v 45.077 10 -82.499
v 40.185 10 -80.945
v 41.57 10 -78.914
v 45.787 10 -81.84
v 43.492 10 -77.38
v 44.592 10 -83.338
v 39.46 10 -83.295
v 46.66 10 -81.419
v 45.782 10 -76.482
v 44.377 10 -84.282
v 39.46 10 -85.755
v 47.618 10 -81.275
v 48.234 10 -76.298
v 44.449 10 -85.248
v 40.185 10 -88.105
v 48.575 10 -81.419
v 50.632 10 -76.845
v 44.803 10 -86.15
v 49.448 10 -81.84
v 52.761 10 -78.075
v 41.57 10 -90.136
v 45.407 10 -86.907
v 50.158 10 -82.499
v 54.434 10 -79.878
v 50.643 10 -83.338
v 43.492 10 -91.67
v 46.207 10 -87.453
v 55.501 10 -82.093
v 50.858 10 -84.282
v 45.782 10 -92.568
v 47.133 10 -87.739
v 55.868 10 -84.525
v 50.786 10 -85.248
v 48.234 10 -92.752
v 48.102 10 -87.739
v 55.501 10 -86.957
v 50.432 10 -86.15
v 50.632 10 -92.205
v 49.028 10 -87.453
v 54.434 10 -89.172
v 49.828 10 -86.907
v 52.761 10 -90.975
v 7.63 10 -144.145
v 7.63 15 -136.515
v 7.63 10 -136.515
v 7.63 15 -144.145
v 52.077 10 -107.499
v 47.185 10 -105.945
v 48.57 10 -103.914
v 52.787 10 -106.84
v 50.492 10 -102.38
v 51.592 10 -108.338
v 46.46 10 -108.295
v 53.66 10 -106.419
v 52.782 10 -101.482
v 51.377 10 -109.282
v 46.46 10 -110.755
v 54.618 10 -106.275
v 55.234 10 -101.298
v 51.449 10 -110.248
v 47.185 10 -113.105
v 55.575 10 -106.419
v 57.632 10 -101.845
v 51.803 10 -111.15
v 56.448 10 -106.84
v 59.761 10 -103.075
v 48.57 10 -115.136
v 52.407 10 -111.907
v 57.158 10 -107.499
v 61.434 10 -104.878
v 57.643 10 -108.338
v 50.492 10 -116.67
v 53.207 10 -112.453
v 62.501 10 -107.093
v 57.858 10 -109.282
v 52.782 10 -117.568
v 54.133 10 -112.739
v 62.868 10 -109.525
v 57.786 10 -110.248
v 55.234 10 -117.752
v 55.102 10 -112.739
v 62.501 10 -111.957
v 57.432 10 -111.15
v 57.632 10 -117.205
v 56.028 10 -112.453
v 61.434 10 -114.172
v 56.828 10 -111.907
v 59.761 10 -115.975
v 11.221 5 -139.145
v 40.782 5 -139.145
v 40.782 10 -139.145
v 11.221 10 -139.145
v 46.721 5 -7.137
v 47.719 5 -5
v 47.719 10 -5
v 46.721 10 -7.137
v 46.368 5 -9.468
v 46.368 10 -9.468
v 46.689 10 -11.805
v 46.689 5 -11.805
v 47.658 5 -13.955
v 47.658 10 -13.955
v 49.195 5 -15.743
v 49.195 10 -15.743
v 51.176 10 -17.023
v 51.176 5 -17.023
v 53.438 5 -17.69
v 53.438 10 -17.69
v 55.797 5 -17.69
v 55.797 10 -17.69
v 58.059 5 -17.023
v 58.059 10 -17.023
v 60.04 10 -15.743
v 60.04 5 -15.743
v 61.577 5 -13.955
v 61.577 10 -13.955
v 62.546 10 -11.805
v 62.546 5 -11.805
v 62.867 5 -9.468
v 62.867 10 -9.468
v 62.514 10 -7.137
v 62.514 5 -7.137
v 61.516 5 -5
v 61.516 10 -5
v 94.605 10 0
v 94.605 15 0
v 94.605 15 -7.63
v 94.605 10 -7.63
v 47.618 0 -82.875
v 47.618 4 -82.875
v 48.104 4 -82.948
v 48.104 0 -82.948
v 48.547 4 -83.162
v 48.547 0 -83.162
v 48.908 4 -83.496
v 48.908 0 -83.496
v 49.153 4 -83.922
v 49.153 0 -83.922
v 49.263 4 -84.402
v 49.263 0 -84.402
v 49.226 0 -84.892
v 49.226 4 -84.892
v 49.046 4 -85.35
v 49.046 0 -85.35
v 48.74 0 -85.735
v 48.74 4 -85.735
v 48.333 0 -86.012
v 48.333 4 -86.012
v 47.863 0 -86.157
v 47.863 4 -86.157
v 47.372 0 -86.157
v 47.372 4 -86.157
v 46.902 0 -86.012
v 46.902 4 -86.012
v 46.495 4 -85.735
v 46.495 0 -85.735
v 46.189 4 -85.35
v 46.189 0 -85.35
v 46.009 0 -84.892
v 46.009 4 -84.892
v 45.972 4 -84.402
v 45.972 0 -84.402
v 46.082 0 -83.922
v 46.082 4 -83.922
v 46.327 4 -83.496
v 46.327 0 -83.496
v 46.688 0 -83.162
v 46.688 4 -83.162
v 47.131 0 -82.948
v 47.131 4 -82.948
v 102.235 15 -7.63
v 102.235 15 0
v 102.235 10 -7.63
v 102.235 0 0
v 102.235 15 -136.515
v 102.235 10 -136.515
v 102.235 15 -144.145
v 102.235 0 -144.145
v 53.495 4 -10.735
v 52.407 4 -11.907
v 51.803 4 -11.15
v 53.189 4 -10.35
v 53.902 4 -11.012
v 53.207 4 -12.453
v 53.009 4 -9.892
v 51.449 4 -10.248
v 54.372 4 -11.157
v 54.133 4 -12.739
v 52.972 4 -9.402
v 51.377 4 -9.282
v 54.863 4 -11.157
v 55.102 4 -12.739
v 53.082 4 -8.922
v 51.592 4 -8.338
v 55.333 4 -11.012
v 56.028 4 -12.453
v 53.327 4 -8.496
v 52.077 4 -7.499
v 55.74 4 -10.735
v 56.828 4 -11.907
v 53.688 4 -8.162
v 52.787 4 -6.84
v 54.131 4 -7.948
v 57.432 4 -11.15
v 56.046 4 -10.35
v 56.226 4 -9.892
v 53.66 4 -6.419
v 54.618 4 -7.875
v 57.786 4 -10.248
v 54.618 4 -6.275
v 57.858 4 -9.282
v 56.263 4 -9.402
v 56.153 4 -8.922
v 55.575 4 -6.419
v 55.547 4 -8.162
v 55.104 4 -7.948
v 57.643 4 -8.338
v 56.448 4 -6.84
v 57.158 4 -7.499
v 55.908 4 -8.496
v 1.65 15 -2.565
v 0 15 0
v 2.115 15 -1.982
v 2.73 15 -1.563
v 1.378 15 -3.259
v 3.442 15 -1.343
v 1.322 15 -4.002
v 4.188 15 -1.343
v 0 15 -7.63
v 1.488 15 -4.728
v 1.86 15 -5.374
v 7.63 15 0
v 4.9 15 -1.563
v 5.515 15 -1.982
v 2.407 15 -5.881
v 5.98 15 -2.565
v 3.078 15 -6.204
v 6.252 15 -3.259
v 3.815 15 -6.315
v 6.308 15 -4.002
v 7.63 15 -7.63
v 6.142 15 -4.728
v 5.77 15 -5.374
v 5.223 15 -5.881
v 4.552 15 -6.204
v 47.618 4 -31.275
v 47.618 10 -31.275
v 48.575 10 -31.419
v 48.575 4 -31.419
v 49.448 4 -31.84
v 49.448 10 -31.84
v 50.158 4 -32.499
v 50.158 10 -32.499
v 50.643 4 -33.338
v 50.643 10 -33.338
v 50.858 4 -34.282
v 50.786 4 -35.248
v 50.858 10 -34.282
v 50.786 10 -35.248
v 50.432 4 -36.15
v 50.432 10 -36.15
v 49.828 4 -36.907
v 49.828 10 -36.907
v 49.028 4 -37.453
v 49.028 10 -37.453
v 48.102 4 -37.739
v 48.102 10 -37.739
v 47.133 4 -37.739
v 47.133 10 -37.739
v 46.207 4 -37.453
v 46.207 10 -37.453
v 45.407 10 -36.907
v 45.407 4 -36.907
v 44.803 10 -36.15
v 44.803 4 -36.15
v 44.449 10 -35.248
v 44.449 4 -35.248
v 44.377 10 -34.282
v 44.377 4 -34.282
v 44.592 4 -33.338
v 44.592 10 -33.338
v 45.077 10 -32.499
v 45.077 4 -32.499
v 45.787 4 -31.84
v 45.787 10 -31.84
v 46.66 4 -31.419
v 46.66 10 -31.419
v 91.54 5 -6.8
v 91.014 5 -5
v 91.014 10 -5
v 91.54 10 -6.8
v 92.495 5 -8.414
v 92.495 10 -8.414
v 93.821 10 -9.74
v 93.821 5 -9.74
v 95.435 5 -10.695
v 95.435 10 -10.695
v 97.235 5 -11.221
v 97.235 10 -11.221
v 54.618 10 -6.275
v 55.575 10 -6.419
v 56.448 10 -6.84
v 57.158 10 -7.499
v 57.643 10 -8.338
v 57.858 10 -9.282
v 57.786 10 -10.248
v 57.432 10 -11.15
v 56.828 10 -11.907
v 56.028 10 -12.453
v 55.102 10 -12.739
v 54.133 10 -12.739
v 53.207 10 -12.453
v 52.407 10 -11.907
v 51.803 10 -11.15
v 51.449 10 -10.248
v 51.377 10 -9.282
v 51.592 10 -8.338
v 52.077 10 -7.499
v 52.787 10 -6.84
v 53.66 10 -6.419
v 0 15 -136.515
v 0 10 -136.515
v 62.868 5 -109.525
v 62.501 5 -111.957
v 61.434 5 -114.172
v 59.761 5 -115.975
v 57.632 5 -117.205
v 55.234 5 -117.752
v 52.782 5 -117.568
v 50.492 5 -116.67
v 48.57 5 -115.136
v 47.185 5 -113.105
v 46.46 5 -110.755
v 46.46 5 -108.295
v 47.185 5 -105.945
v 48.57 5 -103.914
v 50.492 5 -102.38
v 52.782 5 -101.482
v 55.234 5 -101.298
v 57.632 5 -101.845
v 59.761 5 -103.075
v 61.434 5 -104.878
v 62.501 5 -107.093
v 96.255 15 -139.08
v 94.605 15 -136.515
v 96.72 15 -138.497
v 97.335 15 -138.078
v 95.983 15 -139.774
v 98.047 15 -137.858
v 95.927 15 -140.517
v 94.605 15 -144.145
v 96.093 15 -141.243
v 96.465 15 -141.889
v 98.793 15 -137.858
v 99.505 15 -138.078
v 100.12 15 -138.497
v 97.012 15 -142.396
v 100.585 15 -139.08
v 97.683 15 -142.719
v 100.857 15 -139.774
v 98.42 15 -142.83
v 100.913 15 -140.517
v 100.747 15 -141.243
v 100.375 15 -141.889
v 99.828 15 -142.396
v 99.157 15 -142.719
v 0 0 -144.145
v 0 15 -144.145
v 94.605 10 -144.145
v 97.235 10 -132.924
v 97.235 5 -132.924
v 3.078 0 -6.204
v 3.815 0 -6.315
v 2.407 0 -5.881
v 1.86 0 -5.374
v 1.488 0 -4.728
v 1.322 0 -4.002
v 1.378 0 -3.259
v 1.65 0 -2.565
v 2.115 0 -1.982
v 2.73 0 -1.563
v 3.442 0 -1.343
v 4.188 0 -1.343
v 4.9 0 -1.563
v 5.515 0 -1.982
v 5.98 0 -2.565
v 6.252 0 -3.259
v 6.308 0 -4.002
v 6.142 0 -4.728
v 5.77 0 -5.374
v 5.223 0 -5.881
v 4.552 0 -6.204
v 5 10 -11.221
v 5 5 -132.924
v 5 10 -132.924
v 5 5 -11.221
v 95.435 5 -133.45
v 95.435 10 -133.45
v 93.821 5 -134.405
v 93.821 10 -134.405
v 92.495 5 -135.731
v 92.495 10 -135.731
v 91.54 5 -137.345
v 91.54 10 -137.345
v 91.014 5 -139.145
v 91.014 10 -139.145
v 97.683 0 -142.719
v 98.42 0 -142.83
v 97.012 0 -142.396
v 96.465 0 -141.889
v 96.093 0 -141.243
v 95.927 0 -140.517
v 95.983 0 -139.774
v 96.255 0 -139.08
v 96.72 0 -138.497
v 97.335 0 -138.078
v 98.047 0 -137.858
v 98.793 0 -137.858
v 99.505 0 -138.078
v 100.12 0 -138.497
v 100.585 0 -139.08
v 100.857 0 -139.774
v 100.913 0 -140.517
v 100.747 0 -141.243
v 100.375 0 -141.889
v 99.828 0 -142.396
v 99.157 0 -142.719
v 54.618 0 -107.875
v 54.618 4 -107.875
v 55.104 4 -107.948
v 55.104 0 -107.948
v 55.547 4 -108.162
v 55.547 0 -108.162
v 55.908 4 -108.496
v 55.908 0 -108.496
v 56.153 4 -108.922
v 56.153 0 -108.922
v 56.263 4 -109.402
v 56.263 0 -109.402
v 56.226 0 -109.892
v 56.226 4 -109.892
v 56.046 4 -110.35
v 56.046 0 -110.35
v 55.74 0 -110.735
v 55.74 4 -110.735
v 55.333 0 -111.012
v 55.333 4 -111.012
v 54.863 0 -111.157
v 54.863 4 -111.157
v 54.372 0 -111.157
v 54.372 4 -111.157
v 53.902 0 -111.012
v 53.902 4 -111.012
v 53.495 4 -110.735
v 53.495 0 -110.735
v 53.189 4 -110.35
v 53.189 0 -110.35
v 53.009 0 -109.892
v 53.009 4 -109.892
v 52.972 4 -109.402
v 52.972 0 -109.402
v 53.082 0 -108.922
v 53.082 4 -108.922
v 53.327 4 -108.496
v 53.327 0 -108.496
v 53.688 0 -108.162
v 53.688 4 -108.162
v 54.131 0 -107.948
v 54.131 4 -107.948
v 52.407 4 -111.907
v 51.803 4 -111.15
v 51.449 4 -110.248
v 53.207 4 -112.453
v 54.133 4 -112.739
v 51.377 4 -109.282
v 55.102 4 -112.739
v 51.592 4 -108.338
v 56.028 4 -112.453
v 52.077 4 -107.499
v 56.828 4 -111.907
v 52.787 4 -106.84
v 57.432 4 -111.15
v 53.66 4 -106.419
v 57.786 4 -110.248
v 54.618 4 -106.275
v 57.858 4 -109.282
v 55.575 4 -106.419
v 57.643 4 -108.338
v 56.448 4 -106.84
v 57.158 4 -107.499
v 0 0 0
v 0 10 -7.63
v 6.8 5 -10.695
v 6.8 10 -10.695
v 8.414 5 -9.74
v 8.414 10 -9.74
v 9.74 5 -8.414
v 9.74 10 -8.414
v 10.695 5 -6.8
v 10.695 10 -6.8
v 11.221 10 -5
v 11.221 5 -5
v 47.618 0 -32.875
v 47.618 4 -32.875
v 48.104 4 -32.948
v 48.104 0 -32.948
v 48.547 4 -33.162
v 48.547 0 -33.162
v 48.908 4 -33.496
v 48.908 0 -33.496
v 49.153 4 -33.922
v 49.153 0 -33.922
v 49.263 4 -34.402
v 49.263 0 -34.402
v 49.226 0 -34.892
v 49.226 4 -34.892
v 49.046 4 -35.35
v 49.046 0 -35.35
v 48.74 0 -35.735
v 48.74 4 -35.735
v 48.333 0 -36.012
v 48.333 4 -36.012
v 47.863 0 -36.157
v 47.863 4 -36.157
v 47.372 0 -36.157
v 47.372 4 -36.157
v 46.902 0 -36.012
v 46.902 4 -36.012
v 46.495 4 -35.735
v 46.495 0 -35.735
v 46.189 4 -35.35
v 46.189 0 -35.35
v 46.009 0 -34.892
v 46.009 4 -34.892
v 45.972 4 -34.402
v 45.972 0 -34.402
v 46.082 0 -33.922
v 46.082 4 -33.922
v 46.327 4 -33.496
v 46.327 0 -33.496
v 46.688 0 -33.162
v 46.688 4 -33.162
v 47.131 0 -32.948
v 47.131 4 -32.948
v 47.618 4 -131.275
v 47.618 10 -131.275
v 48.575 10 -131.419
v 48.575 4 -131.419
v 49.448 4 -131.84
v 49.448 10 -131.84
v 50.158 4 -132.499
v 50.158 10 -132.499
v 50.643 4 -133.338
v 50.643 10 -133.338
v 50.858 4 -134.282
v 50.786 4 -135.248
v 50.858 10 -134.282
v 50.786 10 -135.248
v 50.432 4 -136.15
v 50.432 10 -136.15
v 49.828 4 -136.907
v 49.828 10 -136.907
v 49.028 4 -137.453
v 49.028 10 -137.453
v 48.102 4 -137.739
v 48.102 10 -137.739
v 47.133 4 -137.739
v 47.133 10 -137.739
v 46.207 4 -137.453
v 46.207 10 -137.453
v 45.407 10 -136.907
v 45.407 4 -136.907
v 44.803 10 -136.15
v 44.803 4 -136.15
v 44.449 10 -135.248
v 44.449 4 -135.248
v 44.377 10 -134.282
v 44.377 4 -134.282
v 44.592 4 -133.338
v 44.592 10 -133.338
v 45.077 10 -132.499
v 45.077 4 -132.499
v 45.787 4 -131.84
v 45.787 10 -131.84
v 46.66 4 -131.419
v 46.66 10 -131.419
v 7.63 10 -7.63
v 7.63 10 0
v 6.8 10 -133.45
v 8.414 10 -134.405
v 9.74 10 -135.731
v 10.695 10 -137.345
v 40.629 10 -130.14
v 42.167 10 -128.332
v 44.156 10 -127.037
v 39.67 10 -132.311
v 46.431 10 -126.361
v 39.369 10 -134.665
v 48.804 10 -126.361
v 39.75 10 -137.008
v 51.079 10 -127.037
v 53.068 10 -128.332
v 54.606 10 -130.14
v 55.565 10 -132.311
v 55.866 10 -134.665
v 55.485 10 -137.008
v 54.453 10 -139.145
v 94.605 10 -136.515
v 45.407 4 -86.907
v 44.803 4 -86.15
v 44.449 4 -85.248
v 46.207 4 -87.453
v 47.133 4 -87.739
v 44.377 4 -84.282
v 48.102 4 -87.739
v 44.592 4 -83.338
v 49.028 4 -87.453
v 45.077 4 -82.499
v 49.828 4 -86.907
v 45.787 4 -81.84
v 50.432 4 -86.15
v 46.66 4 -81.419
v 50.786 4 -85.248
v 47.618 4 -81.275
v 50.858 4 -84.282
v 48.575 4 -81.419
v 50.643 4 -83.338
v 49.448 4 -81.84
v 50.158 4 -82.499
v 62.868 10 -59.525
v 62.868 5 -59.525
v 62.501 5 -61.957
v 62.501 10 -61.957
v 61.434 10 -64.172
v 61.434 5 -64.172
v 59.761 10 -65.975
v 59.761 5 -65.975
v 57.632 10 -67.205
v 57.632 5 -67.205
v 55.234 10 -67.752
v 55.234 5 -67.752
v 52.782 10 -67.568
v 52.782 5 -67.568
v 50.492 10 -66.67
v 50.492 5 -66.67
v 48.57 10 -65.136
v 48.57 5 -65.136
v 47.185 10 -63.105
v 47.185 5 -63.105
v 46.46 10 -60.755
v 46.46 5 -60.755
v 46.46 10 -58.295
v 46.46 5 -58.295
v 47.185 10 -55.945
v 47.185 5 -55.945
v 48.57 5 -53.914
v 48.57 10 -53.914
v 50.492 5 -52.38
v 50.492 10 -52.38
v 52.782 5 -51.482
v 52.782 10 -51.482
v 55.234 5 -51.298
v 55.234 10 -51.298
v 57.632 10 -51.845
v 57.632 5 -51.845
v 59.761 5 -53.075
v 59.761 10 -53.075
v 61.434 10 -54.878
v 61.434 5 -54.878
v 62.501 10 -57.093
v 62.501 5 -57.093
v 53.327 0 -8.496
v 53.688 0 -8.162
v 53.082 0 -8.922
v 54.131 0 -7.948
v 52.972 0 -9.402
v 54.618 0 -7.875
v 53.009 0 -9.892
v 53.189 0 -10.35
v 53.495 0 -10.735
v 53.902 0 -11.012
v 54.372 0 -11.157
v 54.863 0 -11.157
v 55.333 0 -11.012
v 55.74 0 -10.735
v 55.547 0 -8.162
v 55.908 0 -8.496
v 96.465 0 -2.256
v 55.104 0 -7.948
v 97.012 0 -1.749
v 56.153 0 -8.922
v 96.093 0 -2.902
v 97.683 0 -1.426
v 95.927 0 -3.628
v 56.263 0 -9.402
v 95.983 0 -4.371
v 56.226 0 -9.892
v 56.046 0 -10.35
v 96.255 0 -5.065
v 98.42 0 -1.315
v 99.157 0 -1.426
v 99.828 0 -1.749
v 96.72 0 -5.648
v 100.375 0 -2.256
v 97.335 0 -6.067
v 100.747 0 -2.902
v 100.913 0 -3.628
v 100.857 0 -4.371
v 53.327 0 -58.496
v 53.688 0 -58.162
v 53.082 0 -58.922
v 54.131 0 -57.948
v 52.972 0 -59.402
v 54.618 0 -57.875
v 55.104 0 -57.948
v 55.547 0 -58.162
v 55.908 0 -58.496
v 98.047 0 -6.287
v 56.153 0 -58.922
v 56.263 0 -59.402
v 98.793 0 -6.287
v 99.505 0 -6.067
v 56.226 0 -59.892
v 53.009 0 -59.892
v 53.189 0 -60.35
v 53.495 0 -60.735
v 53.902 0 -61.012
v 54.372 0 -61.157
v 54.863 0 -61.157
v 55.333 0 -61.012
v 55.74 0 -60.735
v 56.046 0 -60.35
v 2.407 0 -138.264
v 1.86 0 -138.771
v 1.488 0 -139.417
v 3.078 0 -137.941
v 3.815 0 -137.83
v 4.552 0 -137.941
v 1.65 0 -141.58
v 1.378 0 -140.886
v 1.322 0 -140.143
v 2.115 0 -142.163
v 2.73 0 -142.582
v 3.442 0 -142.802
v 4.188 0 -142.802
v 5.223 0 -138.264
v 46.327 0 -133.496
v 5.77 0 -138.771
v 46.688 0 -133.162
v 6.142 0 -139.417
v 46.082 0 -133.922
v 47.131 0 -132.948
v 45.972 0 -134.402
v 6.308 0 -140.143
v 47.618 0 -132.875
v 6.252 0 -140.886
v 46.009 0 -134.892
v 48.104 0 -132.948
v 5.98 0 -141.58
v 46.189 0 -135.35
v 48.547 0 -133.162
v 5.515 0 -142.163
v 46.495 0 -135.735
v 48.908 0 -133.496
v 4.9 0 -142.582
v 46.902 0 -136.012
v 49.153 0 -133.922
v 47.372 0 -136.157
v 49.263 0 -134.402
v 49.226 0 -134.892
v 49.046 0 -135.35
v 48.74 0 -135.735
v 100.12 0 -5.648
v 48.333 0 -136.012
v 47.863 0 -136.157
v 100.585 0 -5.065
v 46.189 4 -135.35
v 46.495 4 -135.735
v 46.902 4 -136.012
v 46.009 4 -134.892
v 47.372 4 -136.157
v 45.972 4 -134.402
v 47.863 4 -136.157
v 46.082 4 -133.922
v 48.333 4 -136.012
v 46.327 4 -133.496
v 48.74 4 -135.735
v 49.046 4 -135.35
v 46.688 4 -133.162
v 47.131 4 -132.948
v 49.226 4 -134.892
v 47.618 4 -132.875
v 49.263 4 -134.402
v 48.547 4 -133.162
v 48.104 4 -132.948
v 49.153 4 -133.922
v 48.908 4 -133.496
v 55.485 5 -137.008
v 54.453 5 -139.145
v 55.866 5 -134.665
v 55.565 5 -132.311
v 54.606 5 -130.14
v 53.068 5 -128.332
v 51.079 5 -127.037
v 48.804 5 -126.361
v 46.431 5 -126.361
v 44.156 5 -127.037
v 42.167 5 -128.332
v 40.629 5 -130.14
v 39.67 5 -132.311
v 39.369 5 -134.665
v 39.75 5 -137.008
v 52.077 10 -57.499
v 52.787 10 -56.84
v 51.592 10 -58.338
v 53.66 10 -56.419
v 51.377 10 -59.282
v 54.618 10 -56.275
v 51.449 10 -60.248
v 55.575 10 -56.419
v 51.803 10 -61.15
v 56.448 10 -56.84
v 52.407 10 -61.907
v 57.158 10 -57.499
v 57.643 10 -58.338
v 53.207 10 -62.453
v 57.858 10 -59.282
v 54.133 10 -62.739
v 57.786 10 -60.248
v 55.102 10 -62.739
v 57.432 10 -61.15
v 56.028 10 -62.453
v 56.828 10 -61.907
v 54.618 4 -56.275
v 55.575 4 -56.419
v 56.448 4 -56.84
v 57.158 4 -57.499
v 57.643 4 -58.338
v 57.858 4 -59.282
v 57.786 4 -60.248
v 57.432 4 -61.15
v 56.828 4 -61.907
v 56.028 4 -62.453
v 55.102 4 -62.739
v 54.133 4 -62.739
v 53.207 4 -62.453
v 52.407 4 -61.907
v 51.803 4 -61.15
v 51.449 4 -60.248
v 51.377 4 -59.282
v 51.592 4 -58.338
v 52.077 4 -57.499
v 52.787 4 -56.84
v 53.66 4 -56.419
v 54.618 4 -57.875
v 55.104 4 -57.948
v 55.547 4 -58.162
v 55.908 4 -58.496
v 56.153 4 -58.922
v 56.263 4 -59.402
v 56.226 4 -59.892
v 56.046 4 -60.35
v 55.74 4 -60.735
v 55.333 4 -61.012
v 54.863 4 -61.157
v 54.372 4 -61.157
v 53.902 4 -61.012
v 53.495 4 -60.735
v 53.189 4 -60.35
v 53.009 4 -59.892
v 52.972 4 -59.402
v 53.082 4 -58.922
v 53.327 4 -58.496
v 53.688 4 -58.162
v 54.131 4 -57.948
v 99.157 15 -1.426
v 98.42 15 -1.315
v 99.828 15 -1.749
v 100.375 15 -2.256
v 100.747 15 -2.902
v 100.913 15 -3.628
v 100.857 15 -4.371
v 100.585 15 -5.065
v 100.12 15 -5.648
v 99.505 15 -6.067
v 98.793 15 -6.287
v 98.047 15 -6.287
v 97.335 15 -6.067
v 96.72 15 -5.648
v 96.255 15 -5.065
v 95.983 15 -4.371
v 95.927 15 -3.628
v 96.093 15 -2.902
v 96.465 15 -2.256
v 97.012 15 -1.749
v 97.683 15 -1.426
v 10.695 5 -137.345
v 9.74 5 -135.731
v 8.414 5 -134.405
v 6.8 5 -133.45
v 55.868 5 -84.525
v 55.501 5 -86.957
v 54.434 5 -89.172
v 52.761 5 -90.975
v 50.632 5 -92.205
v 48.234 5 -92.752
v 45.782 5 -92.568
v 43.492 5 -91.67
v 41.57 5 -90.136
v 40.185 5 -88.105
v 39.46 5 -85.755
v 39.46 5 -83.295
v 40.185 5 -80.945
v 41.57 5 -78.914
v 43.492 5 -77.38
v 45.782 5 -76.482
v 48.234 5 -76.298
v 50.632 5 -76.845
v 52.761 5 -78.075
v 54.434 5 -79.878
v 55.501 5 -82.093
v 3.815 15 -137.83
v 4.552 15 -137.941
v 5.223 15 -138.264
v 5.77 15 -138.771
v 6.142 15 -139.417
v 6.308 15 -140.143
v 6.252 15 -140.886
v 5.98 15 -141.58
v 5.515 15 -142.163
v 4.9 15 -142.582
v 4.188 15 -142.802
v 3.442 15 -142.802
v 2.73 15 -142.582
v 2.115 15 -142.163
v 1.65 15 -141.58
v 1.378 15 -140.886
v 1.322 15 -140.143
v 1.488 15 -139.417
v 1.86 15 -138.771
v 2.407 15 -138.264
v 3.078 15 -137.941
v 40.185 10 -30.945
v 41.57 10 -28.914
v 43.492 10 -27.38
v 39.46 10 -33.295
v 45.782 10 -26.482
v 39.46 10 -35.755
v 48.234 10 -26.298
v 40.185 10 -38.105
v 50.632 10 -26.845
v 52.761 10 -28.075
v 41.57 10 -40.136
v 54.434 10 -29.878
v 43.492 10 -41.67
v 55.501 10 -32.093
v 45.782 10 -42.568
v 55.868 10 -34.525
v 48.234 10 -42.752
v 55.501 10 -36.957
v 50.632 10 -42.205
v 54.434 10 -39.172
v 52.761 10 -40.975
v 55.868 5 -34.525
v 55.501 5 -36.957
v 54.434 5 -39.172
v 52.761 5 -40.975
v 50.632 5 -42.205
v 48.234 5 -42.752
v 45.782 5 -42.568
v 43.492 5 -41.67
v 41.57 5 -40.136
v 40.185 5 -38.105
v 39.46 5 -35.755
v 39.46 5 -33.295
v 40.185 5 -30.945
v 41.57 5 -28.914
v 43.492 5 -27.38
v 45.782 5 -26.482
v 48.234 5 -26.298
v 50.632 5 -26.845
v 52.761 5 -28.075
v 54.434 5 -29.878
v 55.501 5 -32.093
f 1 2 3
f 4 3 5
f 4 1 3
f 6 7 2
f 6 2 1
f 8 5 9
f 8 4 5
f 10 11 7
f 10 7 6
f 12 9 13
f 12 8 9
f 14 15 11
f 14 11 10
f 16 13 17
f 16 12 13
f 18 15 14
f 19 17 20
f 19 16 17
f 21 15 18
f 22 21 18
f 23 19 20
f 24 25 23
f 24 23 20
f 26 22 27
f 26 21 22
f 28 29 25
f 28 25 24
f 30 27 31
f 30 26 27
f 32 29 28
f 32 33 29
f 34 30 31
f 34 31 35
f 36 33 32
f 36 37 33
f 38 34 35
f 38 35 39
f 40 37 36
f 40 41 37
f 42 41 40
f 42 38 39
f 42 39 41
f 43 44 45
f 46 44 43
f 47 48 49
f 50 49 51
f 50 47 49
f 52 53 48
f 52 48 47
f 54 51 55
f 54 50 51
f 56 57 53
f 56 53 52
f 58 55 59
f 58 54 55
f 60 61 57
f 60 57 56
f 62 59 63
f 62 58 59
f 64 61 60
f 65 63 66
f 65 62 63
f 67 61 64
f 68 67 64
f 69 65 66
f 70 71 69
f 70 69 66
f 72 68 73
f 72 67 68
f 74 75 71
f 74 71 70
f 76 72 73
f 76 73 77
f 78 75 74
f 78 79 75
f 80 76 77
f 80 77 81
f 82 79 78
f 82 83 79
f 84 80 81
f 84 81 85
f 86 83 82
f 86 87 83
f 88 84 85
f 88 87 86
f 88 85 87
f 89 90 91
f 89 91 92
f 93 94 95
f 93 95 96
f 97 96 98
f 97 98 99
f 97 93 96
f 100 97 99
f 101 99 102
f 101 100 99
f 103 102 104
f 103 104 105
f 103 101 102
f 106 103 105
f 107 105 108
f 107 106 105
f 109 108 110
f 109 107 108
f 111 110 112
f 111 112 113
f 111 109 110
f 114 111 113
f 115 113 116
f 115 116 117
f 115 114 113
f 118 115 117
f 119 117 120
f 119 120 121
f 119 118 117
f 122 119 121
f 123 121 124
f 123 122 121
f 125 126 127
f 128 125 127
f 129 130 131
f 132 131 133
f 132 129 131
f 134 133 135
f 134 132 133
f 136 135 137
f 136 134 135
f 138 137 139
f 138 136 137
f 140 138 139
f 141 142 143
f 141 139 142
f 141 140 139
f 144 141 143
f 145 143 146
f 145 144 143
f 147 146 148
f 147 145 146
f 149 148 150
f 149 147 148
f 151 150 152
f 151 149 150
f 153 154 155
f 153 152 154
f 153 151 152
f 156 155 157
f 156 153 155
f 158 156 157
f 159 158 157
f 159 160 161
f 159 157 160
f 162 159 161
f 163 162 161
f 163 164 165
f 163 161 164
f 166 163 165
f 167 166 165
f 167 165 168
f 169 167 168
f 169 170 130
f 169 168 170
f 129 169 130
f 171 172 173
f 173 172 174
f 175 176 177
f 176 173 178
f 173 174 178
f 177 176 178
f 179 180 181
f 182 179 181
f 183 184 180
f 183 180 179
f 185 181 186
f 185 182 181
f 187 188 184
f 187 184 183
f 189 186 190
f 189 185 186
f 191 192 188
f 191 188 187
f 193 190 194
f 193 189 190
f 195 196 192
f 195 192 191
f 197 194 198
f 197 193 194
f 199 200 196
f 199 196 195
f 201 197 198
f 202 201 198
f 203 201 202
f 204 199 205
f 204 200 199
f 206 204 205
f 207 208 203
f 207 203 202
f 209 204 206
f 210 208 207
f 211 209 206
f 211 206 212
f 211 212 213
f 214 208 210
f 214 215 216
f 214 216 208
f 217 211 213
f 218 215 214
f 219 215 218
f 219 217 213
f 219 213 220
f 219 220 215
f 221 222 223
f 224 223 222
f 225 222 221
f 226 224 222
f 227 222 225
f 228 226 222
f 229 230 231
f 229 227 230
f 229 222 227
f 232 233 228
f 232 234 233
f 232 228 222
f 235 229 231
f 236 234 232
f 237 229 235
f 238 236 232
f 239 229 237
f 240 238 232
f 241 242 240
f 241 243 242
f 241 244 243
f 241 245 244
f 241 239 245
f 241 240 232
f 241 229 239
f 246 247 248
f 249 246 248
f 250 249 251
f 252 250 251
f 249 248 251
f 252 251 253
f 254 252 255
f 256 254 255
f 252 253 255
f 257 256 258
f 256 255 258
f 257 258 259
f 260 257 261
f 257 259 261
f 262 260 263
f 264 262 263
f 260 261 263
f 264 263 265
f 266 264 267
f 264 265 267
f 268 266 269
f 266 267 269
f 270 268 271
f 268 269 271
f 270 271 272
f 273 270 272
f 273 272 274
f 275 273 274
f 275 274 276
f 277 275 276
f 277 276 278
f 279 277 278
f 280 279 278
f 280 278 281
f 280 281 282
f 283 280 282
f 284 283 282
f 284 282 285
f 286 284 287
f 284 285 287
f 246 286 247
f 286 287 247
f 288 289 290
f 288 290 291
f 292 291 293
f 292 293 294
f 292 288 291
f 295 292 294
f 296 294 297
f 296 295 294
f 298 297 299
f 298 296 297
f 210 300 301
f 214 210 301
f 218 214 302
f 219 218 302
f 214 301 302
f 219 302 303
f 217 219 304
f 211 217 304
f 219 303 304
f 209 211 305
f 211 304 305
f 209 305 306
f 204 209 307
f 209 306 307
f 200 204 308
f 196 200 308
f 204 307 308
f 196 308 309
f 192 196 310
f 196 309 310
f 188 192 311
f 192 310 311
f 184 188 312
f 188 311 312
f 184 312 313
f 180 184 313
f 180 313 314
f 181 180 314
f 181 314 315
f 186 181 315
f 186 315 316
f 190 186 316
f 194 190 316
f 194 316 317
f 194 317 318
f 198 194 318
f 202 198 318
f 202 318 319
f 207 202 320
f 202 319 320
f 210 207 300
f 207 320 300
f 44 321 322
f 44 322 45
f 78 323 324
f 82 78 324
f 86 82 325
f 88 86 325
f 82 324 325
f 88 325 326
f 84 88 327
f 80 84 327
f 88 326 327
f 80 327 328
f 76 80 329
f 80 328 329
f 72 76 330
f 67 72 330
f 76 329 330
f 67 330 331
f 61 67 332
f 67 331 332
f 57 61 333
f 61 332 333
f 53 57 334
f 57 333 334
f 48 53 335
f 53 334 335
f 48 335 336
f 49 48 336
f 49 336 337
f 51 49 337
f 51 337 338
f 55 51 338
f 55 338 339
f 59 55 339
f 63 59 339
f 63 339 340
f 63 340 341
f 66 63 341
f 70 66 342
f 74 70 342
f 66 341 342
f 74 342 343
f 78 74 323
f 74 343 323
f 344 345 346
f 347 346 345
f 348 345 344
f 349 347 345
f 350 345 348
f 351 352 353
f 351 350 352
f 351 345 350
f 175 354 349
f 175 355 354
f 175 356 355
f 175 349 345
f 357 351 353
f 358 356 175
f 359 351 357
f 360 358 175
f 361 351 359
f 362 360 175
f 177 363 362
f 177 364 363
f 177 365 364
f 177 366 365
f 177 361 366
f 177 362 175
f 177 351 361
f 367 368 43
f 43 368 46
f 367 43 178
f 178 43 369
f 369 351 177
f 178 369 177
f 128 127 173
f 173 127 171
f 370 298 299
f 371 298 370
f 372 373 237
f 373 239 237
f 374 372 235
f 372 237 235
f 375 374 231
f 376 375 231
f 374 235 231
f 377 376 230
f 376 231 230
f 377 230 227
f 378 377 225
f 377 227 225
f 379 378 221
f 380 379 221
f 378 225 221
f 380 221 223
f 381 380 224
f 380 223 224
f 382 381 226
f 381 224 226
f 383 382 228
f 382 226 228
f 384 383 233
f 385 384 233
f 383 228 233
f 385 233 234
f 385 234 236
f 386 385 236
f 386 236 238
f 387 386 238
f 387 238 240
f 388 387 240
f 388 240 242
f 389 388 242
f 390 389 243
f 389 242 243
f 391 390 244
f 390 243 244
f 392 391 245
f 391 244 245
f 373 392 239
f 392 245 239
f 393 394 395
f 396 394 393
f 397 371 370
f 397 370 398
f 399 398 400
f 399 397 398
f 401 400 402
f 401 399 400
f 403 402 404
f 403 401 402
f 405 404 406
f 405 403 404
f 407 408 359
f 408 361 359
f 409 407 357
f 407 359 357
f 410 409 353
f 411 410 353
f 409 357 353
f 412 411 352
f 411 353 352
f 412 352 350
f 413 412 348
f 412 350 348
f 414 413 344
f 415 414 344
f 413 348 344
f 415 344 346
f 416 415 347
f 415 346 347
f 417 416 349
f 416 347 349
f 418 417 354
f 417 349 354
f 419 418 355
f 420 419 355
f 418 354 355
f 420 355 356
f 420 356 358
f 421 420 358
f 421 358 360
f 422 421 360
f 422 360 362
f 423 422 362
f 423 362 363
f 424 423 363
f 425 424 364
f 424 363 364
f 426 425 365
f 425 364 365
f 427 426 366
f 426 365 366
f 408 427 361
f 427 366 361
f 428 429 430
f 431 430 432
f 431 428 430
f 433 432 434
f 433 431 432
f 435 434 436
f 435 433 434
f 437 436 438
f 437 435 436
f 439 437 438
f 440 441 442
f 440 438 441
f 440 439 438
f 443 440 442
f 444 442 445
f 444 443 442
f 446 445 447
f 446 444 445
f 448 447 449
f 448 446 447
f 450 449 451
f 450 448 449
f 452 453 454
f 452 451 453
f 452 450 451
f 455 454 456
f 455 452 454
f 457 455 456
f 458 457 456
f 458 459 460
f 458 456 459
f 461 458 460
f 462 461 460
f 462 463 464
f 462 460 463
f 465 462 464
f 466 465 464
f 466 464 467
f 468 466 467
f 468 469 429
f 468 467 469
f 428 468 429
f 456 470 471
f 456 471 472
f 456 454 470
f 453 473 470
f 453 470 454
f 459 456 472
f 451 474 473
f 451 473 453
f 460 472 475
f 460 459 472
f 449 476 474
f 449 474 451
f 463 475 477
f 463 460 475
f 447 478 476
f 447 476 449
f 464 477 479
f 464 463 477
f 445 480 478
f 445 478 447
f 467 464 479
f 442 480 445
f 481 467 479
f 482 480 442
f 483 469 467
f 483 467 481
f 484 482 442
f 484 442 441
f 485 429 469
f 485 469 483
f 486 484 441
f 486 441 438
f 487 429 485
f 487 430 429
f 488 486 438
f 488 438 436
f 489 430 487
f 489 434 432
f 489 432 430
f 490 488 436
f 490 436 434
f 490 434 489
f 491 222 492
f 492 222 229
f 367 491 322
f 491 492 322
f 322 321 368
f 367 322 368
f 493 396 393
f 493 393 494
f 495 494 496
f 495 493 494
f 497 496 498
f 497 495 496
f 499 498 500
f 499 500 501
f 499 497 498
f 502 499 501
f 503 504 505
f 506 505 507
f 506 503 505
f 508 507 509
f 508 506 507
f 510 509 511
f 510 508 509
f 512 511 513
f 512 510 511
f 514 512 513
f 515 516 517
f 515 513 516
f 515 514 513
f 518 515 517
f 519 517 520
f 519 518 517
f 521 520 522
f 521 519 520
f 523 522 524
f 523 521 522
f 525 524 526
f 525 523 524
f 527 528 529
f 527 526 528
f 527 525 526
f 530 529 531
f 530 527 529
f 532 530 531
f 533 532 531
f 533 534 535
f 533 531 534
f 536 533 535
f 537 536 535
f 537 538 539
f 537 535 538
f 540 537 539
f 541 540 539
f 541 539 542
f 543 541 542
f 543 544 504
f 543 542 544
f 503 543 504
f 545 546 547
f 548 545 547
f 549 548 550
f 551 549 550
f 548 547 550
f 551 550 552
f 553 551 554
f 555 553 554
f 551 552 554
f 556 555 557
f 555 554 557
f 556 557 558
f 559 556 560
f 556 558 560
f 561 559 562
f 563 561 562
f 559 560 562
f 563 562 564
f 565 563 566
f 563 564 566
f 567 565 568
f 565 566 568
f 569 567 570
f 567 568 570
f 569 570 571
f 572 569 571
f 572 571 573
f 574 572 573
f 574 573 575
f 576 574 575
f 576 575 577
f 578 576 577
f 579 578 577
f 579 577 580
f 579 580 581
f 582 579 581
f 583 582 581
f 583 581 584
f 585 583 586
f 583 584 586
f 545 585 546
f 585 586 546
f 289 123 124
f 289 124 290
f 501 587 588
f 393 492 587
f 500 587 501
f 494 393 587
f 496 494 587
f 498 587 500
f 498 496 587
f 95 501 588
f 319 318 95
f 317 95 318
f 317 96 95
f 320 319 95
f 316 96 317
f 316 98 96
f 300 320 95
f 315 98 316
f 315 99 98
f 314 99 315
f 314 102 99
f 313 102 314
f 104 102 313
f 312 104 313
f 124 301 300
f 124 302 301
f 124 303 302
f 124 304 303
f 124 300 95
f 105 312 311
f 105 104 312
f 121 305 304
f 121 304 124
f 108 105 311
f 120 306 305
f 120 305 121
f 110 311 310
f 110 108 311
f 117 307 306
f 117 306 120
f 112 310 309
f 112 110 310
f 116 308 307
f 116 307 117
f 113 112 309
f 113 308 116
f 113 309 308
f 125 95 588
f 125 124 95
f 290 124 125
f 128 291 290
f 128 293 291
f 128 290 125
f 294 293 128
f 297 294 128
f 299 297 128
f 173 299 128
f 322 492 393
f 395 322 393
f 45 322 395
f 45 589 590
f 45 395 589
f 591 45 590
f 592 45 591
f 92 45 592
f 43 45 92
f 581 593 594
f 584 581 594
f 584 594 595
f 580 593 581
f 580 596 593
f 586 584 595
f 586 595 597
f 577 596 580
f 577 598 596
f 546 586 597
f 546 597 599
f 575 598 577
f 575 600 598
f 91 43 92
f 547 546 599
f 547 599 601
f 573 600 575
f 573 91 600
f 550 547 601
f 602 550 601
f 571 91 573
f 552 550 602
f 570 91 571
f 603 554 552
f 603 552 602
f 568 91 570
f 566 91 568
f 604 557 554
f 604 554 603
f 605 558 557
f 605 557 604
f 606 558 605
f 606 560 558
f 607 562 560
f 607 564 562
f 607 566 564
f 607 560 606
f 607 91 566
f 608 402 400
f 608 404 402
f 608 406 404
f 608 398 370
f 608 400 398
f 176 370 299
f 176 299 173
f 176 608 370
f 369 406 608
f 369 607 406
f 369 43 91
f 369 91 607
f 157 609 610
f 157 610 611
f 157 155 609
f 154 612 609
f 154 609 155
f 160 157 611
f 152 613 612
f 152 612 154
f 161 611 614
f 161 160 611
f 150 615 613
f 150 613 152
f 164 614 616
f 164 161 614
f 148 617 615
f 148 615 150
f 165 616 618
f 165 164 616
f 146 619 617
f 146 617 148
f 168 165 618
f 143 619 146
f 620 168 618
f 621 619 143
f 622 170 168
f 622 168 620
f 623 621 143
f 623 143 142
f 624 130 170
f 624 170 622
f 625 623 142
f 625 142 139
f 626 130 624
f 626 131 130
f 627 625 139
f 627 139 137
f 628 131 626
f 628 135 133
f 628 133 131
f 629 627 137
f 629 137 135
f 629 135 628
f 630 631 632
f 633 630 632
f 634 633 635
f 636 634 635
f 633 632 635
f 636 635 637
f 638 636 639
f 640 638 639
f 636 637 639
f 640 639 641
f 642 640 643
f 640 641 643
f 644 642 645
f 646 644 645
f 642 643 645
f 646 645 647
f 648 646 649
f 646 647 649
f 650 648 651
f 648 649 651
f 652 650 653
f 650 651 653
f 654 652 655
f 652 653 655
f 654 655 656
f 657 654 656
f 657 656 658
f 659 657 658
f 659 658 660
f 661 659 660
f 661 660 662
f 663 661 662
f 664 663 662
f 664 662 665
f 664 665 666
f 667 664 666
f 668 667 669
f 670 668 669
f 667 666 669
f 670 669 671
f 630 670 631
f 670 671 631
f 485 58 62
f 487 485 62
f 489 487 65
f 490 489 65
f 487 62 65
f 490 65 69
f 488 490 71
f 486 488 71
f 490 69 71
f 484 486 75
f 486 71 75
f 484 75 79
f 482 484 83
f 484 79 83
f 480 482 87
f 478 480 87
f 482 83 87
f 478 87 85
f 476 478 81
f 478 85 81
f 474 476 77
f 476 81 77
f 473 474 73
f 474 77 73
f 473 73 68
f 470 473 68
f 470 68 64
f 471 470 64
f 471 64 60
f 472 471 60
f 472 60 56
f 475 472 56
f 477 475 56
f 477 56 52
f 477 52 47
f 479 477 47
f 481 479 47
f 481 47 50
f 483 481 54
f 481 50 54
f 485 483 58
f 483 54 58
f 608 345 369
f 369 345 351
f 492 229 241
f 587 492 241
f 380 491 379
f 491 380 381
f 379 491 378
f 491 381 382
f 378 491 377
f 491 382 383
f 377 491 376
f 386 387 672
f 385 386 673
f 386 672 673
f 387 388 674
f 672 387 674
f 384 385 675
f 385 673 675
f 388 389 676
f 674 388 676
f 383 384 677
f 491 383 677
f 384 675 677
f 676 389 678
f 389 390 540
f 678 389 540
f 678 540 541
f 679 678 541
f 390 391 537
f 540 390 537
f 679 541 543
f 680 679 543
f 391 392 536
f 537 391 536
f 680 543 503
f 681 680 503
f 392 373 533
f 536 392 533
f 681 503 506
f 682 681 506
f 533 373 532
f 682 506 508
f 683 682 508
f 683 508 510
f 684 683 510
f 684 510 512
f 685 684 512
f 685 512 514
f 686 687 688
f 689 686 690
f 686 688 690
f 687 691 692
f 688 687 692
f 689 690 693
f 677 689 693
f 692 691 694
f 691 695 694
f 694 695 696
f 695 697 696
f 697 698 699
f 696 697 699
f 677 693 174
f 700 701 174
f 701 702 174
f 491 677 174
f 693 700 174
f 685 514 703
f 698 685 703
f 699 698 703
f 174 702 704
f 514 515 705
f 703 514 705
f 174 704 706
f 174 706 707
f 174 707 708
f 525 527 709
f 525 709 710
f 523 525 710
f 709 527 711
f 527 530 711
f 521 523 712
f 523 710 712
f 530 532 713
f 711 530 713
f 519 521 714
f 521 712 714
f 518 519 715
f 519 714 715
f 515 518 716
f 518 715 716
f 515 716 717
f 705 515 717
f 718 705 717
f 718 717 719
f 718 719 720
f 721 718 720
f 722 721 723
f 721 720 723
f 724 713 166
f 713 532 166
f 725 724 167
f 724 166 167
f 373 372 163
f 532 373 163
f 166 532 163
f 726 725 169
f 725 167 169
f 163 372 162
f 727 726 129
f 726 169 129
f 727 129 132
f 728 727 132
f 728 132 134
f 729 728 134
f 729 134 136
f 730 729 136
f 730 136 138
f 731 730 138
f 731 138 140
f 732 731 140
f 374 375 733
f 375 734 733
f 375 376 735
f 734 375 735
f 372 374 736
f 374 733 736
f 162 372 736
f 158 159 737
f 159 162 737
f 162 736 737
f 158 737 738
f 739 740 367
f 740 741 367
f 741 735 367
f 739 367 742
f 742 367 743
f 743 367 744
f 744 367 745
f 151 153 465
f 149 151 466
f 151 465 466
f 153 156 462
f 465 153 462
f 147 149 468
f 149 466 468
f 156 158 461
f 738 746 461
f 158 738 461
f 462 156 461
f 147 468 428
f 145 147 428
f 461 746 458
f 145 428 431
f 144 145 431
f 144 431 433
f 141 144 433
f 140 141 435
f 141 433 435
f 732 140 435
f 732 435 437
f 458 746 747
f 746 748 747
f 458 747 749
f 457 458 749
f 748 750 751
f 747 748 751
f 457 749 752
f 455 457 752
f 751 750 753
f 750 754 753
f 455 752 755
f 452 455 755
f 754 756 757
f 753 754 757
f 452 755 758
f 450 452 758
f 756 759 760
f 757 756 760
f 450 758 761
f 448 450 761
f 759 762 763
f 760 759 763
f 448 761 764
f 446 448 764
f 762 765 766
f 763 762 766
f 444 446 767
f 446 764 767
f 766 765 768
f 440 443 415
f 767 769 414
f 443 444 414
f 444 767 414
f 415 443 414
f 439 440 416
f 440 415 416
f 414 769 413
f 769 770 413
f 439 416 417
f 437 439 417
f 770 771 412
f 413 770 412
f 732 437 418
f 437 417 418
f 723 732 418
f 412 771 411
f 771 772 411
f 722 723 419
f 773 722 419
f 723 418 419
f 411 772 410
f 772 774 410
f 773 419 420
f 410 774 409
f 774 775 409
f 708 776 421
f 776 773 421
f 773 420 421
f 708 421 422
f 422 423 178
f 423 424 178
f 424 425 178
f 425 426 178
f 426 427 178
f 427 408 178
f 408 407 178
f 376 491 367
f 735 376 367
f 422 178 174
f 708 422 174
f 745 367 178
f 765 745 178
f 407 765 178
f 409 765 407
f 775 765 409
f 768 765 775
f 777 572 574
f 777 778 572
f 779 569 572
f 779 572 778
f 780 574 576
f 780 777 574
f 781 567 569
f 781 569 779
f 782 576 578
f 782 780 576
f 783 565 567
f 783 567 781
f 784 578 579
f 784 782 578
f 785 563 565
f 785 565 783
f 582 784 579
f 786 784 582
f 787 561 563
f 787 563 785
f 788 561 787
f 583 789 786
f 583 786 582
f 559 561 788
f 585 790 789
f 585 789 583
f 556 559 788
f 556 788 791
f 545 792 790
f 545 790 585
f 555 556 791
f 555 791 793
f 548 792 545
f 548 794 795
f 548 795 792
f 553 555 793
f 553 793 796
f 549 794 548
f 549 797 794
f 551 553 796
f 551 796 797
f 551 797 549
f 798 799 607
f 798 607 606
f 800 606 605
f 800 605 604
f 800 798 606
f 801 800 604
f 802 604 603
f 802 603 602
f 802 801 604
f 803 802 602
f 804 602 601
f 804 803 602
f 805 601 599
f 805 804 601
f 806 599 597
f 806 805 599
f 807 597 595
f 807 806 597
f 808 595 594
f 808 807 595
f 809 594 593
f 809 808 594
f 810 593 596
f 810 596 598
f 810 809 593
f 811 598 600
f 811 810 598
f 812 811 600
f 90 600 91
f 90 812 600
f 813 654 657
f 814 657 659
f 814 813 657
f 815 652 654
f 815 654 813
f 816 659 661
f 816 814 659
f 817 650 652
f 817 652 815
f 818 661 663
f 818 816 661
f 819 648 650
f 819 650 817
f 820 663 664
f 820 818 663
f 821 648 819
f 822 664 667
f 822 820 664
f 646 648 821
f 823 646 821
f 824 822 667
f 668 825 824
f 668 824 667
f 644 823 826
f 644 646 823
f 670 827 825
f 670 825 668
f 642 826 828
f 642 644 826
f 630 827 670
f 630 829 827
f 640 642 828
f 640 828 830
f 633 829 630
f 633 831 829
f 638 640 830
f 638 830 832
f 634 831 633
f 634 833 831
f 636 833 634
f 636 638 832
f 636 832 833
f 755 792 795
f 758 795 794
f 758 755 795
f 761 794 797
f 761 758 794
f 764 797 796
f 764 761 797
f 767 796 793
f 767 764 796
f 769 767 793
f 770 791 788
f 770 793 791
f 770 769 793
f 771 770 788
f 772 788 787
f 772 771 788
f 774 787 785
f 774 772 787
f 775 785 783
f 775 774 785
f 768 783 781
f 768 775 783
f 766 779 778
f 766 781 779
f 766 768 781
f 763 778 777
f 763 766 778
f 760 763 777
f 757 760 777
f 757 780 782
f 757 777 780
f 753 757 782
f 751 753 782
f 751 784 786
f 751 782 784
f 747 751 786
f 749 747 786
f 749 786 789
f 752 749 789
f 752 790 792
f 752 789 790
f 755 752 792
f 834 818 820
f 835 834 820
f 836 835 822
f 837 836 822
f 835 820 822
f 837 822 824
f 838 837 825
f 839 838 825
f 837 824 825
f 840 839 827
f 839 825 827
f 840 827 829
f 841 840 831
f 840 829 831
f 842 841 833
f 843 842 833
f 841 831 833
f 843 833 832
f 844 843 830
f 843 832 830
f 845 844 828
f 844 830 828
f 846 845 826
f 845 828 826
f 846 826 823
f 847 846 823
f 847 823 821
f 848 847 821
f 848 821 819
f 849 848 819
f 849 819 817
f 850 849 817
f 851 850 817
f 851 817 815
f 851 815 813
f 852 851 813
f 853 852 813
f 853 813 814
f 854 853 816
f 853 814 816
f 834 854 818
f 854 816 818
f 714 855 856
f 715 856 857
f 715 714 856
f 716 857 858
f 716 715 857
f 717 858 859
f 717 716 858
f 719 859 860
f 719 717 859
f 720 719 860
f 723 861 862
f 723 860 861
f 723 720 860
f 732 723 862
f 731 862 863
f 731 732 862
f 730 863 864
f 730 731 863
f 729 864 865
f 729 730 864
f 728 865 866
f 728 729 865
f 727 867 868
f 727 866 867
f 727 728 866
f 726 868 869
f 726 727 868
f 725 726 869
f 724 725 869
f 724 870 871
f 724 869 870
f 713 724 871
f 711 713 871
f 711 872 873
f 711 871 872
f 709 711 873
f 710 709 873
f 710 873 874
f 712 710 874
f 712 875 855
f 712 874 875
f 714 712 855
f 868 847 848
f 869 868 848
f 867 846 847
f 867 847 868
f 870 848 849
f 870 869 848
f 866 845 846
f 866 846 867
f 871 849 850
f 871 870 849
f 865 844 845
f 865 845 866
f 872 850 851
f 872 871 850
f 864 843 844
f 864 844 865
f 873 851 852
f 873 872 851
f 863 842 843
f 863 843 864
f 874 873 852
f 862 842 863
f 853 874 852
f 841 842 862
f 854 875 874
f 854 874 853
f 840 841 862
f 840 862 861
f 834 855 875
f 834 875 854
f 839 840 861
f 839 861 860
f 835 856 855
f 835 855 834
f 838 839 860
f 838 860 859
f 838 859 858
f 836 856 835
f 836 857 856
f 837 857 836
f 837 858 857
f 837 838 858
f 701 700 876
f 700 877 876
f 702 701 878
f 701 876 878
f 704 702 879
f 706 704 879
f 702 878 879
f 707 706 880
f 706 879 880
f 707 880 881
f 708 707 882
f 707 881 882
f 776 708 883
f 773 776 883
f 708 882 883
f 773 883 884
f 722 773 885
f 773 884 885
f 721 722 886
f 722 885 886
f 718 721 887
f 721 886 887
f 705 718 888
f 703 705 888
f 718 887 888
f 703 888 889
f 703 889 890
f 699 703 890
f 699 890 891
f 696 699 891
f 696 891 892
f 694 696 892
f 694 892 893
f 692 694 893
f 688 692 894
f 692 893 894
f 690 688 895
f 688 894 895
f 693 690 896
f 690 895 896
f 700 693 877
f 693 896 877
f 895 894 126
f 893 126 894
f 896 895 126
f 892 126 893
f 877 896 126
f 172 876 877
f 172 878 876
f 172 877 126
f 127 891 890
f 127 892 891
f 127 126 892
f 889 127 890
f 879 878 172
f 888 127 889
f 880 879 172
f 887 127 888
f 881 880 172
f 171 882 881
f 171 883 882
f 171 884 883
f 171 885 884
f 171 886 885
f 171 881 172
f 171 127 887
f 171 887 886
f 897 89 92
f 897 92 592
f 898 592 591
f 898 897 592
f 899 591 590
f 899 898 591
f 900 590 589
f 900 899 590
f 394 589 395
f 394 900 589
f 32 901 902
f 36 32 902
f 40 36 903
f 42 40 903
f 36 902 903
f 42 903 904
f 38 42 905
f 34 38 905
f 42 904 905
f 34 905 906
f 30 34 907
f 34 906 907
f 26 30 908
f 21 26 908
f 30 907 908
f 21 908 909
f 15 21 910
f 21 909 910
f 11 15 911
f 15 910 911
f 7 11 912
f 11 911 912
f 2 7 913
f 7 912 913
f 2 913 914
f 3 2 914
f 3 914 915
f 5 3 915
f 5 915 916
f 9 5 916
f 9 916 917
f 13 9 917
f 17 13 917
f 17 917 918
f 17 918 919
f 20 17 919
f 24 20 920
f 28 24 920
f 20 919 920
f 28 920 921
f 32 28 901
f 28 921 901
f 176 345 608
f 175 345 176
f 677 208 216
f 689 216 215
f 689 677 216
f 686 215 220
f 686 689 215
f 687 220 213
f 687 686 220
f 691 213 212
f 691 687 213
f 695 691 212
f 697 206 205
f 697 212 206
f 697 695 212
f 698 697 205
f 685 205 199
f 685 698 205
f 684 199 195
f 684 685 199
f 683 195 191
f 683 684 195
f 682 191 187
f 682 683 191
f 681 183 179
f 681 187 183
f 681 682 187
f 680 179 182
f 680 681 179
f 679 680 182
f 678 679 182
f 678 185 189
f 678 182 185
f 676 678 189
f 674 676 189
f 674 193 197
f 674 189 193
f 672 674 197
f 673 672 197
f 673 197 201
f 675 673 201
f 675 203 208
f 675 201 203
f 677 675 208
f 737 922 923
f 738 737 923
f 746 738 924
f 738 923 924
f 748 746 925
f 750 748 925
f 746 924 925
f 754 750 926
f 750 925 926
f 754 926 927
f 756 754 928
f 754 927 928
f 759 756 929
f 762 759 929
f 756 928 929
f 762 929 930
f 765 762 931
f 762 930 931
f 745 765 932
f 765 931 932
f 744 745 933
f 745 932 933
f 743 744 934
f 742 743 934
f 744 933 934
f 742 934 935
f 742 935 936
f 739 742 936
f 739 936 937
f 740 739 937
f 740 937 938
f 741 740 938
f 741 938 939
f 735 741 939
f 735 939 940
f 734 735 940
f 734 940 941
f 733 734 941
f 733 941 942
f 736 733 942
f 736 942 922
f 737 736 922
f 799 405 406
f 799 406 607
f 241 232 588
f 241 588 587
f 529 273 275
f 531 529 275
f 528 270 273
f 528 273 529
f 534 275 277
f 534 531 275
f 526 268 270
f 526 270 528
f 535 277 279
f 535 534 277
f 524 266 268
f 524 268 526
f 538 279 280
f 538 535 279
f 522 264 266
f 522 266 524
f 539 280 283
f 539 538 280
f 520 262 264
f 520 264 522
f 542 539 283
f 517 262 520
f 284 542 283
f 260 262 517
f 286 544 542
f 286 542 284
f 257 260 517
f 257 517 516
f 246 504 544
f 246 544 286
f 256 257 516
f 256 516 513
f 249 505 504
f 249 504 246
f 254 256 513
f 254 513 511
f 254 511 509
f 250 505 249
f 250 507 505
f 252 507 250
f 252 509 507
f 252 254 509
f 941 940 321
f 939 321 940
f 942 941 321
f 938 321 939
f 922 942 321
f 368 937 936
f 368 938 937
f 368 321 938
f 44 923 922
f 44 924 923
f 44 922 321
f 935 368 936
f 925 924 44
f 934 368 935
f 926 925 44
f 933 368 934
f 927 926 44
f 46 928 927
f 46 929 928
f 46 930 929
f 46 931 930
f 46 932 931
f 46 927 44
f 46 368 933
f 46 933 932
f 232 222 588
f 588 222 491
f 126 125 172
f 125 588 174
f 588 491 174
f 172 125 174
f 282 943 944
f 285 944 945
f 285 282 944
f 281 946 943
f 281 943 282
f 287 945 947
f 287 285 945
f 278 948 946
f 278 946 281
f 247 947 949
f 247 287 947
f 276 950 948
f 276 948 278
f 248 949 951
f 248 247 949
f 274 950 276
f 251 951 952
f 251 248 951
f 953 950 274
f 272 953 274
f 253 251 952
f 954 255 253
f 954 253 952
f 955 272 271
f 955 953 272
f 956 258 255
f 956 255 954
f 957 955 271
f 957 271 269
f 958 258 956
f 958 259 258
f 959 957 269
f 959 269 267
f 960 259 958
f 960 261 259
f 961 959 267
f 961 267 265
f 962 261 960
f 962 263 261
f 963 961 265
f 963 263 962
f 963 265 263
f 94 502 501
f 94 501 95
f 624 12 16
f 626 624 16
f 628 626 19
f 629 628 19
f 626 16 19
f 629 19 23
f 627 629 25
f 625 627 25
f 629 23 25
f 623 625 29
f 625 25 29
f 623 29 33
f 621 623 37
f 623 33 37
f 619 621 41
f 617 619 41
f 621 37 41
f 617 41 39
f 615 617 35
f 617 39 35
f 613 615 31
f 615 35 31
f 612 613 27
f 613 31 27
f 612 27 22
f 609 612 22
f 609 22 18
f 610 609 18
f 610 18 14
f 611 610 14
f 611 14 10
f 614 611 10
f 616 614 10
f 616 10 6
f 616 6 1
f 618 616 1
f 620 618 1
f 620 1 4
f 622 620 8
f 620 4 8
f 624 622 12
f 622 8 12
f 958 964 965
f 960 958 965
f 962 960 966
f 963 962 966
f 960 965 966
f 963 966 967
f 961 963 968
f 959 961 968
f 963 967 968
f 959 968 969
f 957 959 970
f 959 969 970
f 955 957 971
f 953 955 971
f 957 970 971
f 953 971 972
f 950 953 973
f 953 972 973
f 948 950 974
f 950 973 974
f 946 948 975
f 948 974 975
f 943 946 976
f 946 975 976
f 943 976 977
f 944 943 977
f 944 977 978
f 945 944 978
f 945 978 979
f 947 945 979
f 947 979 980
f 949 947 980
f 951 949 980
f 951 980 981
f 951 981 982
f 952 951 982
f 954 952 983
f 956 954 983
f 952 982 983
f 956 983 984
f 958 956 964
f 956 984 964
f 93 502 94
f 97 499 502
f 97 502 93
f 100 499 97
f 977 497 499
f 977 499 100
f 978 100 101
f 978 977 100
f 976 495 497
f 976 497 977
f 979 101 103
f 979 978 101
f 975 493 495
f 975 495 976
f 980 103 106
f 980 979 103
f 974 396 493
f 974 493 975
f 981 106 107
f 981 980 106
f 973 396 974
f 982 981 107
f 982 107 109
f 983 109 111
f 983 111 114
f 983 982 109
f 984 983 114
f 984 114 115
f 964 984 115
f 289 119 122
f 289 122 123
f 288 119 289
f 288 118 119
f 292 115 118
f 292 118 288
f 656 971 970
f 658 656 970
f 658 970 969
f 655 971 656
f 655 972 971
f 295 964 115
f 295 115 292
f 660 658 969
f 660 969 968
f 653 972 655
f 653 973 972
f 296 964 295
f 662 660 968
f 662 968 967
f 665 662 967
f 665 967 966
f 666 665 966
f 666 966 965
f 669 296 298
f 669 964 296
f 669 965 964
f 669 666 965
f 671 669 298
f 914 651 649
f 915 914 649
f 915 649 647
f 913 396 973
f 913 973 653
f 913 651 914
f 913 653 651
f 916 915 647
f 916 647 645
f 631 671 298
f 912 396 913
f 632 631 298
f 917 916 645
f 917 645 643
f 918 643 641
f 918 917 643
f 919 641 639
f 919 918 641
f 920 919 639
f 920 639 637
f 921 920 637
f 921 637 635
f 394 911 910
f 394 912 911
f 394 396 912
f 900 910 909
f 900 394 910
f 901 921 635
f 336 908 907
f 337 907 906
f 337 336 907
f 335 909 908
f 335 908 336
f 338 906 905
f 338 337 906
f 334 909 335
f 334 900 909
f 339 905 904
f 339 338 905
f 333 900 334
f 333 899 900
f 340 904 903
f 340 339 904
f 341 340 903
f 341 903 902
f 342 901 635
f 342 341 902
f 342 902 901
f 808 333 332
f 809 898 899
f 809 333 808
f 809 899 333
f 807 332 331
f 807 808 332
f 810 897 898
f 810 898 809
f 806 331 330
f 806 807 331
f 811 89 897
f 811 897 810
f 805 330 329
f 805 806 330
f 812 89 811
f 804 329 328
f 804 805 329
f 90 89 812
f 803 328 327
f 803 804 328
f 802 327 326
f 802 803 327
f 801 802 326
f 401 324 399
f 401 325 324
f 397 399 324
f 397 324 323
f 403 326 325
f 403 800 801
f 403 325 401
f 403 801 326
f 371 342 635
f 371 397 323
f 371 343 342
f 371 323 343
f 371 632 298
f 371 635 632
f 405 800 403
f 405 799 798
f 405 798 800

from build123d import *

# Parameters (mm, degrees)
SKETCH1_W           = 102.235
SKETCH1_H           = 144.145
SKETCH1_R           = 1.65
BOSS_EXTRUDE1_DEPTH = 10
SKETCH2_R           = 3.25
CUT_EXTRUDE1_DEPTH  = 6
SKETCH4_R           = 2.5
CUT_EXTRUDE2_DEPTH  = 178.002192783
BOSS_EXTRUDE2_START = 5
SKETCH5_W           = 7.63
SKETCH5_H           = 7.63
SKETCH5_R           = 2.5
BOSS_EXTRUDE2_DEPTH = 5
SHELL4_START        = 5
SHELL4_OUTLINE_R    = 8.25
SHELL4_DEPTH        = 5


# Read off the part's stored shape, not the designer's step: Shell4
with BuildPart() as part:
    # Sketch1 → Boss-Extrude1 (new body)
    with BuildSketch(Plane(origin=(0, 0, 0), x_dir=(1, 0, 0), z_dir=(0, 1, 0))):
        with Locations((51.1175, 72.0725)):
            Rectangle(SKETCH1_W, SKETCH1_H)
        with Locations(Location((47.6175, 134.525, 0), (0, 0, 270))):
            Circle(SKETCH1_R, mode=Mode.SUBTRACT)
        with Locations(Location((54.6175, 109.525, 0), (0, 0, 270))):
            Circle(SKETCH1_R, mode=Mode.SUBTRACT)
        with Locations(Location((54.6175, 59.525, 0), (0, 0, 270))):
            Circle(SKETCH1_R, mode=Mode.SUBTRACT)
        with Locations(Location((47.6175, 84.525, 0), (0, 0, 270))):
            Circle(SKETCH1_R, mode=Mode.SUBTRACT)
        with Locations(Location((54.6175, 9.525, 0), (0, 0, 270))):
            Circle(SKETCH1_R, mode=Mode.SUBTRACT)
        with Locations(Location((47.6175, 34.525, 0), (0, 0, 270))):
            Circle(SKETCH1_R, mode=Mode.SUBTRACT)
    extrude(amount=BOSS_EXTRUDE1_DEPTH)

    # Sketch2 → Cut-Extrude1 (cut)
    with BuildSketch(Plane(origin=(0, 10, 0), x_dir=(1, 0, 0), z_dir=(0, 1, 0))):
        with Locations(Location((47.6175, 134.525, 0), (0, 0, 270))):
            Circle(SKETCH2_R)
        with Locations(Location((54.6175, 109.525, 0), (0, 0, 270))):
            Circle(SKETCH2_R)
        with Locations(Location((47.6175, 84.525, 0), (0, 0, 270))):
            Circle(SKETCH2_R)
        with Locations(Location((54.6175, 59.525, 0), (0, 0, 270))):
            Circle(SKETCH2_R)
        with Locations(Location((47.6175, 34.525, 0), (0, 0, 270))):
            Circle(SKETCH2_R)
        with Locations(Location((54.6175, 9.525, 0), (0, 0, 270))):
            Circle(SKETCH2_R)
    extrude(amount=-CUT_EXTRUDE1_DEPTH, mode=Mode.SUBTRACT)

    # Sketch4 → Cut-Extrude2 (cut, through all)
    with BuildSketch(Plane(origin=(0, 10, 0), x_dir=(1, 0, 0), z_dir=(0, 1, 0))):
        with Locations(Location((3.815, 140.33, 0), (0, 0, 270))):
            Circle(SKETCH4_R)
        with Locations(Location((98.42, 140.33, 0), (0, 0, 90))):
            Circle(SKETCH4_R)
        with Locations(Location((98.42, 3.815, 0), (0, 0, 270))):
            Circle(SKETCH4_R)
        with Locations(Location((3.815, 3.815, 0), (0, 0, 90))):
            Circle(SKETCH4_R)
    extrude(amount=-CUT_EXTRUDE2_DEPTH, mode=Mode.SUBTRACT)

    # Sketch5 → Boss-Extrude2 (add)
    # profile 1 of 4: a face of its own
    with BuildSketch(Plane(origin=(0, 10, 0), x_dir=(1, 0, 0), z_dir=(0, 1, 0)).offset(BOSS_EXTRUDE2_START)):
        with Locations((3.815, 140.33)):
            Rectangle(SKETCH5_W, SKETCH5_H)
        with Locations(Location((3.815, 140.33, 0), (0, 0, 270))):
            Circle(SKETCH5_R, mode=Mode.SUBTRACT)
    # profile 2 of 4: a face of its own
    with BuildSketch(Plane(origin=(0, 10, 0), x_dir=(1, 0, 0), z_dir=(0, 1, 0)).offset(BOSS_EXTRUDE2_START)):
        with Locations((98.42, 140.33)):
            Rectangle(SKETCH5_W, SKETCH5_H)
        with Locations(Location((98.42, 140.33, 0), (0, 0, 90))):
            Circle(SKETCH5_R, mode=Mode.SUBTRACT)
    # profile 3 of 4: a face of its own
    with BuildSketch(Plane(origin=(0, 10, 0), x_dir=(1, 0, 0), z_dir=(0, 1, 0)).offset(BOSS_EXTRUDE2_START)):
        with Locations((98.42, 3.815)):
            Rectangle(SKETCH5_W, SKETCH5_H)
        with Locations(Location((98.42, 3.815, 0), (0, 0, 270))):
            Circle(SKETCH5_R, mode=Mode.SUBTRACT)
    # profile 4 of 4: a face of its own
    with BuildSketch(Plane(origin=(0, 10, 0), x_dir=(1, 0, 0), z_dir=(0, 1, 0)).offset(BOSS_EXTRUDE2_START)):
        with Locations((3.815, 3.815)):
            Rectangle(SKETCH5_W, SKETCH5_H)
        with Locations(Location((3.815, 3.815, 0), (0, 0, 90))):
            Circle(SKETCH5_R, mode=Mode.SUBTRACT)
    extrude(amount=-BOSS_EXTRUDE2_DEPTH)

    # Shell4 outline → Shell4 (cut)
    with BuildSketch(Plane(origin=(0, 0, 0), x_dir=(1, 0, 0), z_dir=(0, 1, 0)).offset(SHELL4_START)):
        with BuildLine():
            ThreePointArc((47.719175928, 5), (54.6175, 17.775), (61.515824072, 5))
            Line((61.515824072, 5), (91.01420666, 5))
            ThreePointArc((91.01420666, 5), (93.116699141, 9.118300859), (97.235, 11.22079334))
            Line((97.235, 11.22079334), (97.235, 132.92420666))
            ThreePointArc((97.235, 132.92420666), (93.116699141, 135.026699141), (91.01420666, 139.145))
            Line((91.01420666, 139.145), (54.452564008, 139.145))
            ThreePointArc((54.452564008, 139.145), (47.6175, 126.275), (40.782435992, 139.145))
            Line((40.782435992, 139.145), (11.22079334, 139.145))
            ThreePointArc((11.22079334, 139.145), (9.118300859, 135.026699141), (5, 132.92420666))
            Line((5, 132.92420666), (5, 11.22079334))
            ThreePointArc((5, 11.22079334), (9.118300859, 9.118300859), (11.22079334, 5))
            Line((11.22079334, 5), (47.719175928, 5))
        make_face()
        with Locations((47.6175, 34.525)):
            Circle(SHELL4_OUTLINE_R, mode=Mode.SUBTRACT)
        with Locations((54.6175, 59.525)):
            Circle(SHELL4_OUTLINE_R, mode=Mode.SUBTRACT)
        with Locations((47.6175, 84.525)):
            Circle(SHELL4_OUTLINE_R, mode=Mode.SUBTRACT)
        with Locations((54.6175, 109.525)):
            Circle(SHELL4_OUTLINE_R, mode=Mode.SUBTRACT)
    extrude(amount=SHELL4_DEPTH, mode=Mode.SUBTRACT)


solid = part.part
